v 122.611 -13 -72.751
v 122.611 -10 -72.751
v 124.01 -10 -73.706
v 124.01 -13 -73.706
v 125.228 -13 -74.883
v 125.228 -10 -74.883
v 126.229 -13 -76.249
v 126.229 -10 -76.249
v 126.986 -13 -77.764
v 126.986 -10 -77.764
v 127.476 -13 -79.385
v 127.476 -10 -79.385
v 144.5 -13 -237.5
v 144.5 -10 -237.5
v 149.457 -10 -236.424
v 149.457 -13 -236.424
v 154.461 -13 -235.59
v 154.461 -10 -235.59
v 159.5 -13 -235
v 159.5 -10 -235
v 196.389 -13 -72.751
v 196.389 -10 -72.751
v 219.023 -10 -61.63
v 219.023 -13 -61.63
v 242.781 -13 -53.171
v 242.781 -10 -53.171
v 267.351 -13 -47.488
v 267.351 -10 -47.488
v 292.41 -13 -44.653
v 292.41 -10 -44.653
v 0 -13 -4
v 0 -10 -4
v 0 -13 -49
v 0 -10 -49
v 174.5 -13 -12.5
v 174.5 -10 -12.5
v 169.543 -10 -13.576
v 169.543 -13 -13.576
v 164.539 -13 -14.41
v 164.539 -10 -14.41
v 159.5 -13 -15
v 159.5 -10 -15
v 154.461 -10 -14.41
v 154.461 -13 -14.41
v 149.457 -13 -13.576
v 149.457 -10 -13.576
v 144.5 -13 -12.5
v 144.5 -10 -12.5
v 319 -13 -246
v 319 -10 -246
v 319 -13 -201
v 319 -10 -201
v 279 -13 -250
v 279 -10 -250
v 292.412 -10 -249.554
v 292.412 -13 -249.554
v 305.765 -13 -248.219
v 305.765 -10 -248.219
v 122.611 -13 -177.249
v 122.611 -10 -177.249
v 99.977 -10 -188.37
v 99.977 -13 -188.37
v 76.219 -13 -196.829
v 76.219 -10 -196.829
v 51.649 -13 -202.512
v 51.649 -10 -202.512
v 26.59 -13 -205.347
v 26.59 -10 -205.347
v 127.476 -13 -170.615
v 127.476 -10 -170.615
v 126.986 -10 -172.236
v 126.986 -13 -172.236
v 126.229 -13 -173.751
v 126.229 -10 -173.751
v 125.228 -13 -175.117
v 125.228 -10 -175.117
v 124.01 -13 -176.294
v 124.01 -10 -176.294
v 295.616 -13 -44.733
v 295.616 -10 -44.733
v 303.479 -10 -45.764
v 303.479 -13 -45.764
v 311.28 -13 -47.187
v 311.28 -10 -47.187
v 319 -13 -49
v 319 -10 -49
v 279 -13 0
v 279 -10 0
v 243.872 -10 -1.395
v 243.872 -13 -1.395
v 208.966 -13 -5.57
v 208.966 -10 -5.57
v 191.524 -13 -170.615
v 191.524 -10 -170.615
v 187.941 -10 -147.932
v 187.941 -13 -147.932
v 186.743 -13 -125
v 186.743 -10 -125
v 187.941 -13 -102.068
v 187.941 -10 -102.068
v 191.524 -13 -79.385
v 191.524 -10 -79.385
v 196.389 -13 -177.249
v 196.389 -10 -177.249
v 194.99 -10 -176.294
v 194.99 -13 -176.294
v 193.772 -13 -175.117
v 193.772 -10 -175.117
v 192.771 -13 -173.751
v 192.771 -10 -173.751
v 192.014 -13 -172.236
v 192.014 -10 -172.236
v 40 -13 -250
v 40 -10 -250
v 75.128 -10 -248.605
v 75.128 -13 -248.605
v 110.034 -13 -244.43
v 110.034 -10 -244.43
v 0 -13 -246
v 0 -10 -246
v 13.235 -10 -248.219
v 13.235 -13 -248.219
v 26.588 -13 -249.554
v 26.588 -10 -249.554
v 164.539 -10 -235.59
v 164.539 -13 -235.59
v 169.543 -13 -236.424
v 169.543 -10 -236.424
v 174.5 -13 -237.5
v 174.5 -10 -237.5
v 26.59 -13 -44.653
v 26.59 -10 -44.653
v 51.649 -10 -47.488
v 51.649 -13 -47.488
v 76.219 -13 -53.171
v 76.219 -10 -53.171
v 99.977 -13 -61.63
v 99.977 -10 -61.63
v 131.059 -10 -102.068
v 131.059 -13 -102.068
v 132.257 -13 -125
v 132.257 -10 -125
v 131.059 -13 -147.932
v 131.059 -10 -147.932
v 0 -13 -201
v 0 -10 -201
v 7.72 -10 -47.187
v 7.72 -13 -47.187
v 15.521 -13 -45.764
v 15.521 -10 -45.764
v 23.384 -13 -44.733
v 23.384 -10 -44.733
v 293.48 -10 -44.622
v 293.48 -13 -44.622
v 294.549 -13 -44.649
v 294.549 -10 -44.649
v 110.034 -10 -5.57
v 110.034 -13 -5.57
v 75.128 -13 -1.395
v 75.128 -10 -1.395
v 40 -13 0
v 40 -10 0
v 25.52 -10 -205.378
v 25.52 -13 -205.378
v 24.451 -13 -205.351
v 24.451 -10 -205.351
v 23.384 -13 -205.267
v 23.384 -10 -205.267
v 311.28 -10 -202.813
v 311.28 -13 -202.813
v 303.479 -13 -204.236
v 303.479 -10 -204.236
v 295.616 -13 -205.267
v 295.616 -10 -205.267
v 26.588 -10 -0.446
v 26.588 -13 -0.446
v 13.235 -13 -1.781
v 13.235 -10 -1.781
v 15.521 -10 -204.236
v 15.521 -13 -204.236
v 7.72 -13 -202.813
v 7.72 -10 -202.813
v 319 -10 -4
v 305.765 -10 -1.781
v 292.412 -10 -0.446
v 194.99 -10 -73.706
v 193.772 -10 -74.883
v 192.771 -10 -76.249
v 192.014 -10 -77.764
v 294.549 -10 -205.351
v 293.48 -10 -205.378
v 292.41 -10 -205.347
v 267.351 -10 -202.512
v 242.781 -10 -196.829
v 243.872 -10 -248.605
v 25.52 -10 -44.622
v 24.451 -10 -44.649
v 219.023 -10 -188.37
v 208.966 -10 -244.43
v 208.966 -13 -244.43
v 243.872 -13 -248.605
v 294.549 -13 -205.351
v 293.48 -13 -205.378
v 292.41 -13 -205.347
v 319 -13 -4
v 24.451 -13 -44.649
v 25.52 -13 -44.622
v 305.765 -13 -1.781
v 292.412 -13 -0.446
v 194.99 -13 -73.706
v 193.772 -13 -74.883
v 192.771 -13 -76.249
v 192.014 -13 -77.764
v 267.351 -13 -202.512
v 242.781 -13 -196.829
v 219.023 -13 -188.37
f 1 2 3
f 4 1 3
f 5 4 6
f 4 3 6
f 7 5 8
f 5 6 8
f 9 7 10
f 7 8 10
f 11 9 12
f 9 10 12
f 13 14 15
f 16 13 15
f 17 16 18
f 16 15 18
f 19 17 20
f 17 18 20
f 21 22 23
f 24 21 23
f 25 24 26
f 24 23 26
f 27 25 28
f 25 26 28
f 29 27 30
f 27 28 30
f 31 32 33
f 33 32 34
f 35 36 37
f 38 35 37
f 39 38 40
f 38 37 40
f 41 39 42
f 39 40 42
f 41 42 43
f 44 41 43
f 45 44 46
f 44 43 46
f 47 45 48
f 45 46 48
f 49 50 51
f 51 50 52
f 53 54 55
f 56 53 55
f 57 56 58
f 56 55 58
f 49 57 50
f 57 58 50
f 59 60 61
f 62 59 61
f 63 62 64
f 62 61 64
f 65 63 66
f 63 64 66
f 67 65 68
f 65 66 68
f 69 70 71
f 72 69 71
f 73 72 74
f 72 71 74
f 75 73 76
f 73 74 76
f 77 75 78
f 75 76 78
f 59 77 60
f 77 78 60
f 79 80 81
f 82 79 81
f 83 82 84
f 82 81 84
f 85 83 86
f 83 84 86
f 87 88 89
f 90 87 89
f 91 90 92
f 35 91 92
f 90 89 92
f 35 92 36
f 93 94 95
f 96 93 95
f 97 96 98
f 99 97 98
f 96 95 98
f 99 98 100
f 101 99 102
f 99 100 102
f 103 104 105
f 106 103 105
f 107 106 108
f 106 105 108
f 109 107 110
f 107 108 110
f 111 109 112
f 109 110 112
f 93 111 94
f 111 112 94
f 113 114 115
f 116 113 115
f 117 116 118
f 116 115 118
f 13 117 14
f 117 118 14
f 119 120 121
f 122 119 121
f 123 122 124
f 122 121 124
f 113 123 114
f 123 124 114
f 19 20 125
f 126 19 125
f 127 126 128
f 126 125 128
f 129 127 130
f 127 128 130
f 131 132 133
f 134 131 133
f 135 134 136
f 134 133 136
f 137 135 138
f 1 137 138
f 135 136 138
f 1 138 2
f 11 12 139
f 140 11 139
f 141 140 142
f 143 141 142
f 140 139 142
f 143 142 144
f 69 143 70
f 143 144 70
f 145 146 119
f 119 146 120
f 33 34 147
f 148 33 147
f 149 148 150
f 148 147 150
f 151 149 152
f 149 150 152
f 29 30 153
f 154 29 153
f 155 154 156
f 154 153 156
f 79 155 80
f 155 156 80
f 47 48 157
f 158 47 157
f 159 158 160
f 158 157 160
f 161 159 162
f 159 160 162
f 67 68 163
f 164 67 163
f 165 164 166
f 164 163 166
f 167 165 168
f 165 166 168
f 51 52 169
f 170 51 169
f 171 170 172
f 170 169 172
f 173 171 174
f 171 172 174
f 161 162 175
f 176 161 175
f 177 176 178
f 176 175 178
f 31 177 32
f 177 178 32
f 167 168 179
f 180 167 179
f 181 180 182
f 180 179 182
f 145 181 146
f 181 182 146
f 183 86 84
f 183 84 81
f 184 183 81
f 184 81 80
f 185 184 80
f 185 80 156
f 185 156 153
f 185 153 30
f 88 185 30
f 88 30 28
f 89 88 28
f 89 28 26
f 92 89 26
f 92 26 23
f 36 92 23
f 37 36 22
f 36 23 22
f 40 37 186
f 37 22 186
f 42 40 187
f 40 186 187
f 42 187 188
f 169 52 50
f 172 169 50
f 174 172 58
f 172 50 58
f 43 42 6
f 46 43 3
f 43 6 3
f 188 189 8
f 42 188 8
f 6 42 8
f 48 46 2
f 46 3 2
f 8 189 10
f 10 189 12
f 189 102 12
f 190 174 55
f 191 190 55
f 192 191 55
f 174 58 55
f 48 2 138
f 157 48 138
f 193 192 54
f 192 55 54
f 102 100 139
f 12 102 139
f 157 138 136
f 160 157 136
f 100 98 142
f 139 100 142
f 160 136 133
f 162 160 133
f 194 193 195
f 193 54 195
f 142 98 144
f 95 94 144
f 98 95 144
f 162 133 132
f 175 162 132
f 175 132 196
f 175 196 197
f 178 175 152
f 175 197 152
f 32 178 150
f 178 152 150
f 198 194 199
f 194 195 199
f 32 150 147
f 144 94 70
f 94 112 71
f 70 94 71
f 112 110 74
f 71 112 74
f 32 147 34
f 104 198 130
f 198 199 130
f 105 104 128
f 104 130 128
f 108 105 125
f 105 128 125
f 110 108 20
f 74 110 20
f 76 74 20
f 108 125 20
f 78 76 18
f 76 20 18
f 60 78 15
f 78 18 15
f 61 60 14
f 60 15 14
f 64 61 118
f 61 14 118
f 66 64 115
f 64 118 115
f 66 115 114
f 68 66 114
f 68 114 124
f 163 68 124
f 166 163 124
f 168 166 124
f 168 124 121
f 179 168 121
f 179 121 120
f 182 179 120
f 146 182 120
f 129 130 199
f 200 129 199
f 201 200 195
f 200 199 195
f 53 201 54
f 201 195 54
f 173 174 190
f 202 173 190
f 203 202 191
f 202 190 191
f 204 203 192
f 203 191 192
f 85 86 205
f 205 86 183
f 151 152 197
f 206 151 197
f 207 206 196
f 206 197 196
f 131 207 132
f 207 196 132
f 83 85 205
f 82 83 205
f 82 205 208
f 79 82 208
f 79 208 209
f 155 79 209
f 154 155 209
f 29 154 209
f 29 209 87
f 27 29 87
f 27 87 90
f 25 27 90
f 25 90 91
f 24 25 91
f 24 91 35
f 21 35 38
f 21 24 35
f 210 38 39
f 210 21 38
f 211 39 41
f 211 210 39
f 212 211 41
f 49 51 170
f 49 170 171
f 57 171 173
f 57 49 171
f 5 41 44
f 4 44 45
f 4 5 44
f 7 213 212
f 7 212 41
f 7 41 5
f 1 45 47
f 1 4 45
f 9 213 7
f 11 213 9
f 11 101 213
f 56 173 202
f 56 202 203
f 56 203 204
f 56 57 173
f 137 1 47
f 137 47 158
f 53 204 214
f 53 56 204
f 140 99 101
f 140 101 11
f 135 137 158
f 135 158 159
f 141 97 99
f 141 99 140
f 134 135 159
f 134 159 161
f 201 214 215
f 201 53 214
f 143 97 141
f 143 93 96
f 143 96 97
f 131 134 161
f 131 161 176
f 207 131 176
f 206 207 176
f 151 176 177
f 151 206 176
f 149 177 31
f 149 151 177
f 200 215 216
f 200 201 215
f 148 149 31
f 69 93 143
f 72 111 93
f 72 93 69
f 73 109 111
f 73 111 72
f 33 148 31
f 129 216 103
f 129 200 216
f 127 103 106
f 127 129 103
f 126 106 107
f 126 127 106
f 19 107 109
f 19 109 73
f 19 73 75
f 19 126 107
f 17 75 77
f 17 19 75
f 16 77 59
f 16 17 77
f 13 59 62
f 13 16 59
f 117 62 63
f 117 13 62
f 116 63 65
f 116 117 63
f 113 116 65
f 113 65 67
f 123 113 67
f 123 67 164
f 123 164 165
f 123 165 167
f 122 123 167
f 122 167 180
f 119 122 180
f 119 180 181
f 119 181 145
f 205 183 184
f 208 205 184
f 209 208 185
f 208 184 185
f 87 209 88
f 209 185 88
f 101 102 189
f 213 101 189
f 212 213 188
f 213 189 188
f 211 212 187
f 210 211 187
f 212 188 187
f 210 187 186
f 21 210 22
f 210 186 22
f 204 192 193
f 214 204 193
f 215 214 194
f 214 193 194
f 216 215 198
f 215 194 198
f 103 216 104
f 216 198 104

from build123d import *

# Parameters (mm, degrees)
BOSS_EXTRUDE1_START = -10
BOSS_EXTRUDE1_DEPTH = 3


with BuildPart() as part:
    # Sketch1 → Boss-Extrude1 (new body)
    with BuildSketch(Plane(origin=(0, 0, 0), x_dir=(1, 0, 0), z_dir=(0, 1, 0)).offset(BOSS_EXTRUDE1_START)):
        with BuildLine():
            Line((319, 246), (319, 201))
            ThreePointArc((319, 201), (307.388484736, 203.573435825), (295.616405389, 205.2669548))
            ThreePointArc((295.616405389, 205.2669548), (294.01464809, 205.37142016), (292.409672101, 205.347098762))
            ThreePointArc((292.409672101, 205.347098762), (242.780979678, 196.828732334), (196.389162845, 177.248921069))
            ThreePointArc((196.389162845, 177.248921069), (193.242585284, 174.455386906), (191.523683958, 170.614792982))
            ThreePointArc((191.523683958, 170.614792982), (186.742852856, 125), (191.523683958, 79.385207018))
            ThreePointArc((191.523683958, 79.385207018), (193.242585284, 75.544613094), (196.389162845, 72.751078931))
            ThreePointArc((196.389162845, 72.751078931), (242.780979678, 53.171267666), (292.409672101, 44.652901238))
            ThreePointArc((292.409672101, 44.652901238), (294.01464809, 44.62857984), (295.616405389, 44.7330452))
            ThreePointArc((295.616405389, 44.7330452), (307.388484736, 46.426564175), (319, 49))
            Line((319, 49), (319, 4))
            ThreePointArc((319, 4), (299.099751242, 1.002487578), (279, 0))
            ThreePointArc((279, 0), (226.377523813, 3.136099081), (174.5, 12.5))
            ThreePointArc((174.5, 12.5), (167.04561677, 14.023700621), (159.5, 15))
            ThreePointArc((159.5, 15), (151.95438323, 14.023700621), (144.5, 12.5))
            ThreePointArc((144.5, 12.5), (92.622476187, 3.136099081), (40, 0))
            ThreePointArc((40, 0), (19.900248758, 1.002487578), (0, 4))
            Line((0, 4), (0, 49))
            ThreePointArc((0, 49), (11.611515264, 46.426564175), (23.383594611, 44.7330452))
            ThreePointArc((23.383594611, 44.7330452), (24.98535191, 44.62857984), (26.590327899, 44.652901238))
            ThreePointArc((26.590327899, 44.652901238), (76.219020322, 53.171267666), (122.610837155, 72.751078931))
            ThreePointArc((122.610837155, 72.751078931), (125.757414716, 75.544613094), (127.476316042, 79.385207018))
            ThreePointArc((127.476316042, 79.385207018), (132.257147144, 125), (127.476316042, 170.614792982))
            ThreePointArc((127.476316042, 170.614792982), (125.757414716, 174.455386906), (122.610837155, 177.248921069))
            ThreePointArc((122.610837155, 177.248921069), (76.219020322, 196.828732334), (26.590327899, 205.347098762))
            ThreePointArc((26.590327899, 205.347098762), (24.98535191, 205.37142016), (23.383594611, 205.2669548))
            ThreePointArc((23.383594611, 205.2669548), (11.611515264, 203.573435825), (0, 201))
            Line((0, 201), (0, 246))
            ThreePointArc((0, 246), (19.900248758, 248.997512422), (40, 250))
            ThreePointArc((40, 250), (92.622476187, 246.863900919), (144.5, 237.5))
            ThreePointArc((144.5, 237.5), (151.95438323, 235.976299379), (159.5, 235))
            ThreePointArc((159.5, 235), (167.04561677, 235.976299379), (174.5, 237.5))
            ThreePointArc((174.5, 237.5), (226.377523813, 246.863900919), (279, 250))
            ThreePointArc((279, 250), (299.099751242, 248.997512422), (319, 246))
        make_face()
    extrude(amount=-BOSS_EXTRUDE1_DEPTH)


solid = part.part
